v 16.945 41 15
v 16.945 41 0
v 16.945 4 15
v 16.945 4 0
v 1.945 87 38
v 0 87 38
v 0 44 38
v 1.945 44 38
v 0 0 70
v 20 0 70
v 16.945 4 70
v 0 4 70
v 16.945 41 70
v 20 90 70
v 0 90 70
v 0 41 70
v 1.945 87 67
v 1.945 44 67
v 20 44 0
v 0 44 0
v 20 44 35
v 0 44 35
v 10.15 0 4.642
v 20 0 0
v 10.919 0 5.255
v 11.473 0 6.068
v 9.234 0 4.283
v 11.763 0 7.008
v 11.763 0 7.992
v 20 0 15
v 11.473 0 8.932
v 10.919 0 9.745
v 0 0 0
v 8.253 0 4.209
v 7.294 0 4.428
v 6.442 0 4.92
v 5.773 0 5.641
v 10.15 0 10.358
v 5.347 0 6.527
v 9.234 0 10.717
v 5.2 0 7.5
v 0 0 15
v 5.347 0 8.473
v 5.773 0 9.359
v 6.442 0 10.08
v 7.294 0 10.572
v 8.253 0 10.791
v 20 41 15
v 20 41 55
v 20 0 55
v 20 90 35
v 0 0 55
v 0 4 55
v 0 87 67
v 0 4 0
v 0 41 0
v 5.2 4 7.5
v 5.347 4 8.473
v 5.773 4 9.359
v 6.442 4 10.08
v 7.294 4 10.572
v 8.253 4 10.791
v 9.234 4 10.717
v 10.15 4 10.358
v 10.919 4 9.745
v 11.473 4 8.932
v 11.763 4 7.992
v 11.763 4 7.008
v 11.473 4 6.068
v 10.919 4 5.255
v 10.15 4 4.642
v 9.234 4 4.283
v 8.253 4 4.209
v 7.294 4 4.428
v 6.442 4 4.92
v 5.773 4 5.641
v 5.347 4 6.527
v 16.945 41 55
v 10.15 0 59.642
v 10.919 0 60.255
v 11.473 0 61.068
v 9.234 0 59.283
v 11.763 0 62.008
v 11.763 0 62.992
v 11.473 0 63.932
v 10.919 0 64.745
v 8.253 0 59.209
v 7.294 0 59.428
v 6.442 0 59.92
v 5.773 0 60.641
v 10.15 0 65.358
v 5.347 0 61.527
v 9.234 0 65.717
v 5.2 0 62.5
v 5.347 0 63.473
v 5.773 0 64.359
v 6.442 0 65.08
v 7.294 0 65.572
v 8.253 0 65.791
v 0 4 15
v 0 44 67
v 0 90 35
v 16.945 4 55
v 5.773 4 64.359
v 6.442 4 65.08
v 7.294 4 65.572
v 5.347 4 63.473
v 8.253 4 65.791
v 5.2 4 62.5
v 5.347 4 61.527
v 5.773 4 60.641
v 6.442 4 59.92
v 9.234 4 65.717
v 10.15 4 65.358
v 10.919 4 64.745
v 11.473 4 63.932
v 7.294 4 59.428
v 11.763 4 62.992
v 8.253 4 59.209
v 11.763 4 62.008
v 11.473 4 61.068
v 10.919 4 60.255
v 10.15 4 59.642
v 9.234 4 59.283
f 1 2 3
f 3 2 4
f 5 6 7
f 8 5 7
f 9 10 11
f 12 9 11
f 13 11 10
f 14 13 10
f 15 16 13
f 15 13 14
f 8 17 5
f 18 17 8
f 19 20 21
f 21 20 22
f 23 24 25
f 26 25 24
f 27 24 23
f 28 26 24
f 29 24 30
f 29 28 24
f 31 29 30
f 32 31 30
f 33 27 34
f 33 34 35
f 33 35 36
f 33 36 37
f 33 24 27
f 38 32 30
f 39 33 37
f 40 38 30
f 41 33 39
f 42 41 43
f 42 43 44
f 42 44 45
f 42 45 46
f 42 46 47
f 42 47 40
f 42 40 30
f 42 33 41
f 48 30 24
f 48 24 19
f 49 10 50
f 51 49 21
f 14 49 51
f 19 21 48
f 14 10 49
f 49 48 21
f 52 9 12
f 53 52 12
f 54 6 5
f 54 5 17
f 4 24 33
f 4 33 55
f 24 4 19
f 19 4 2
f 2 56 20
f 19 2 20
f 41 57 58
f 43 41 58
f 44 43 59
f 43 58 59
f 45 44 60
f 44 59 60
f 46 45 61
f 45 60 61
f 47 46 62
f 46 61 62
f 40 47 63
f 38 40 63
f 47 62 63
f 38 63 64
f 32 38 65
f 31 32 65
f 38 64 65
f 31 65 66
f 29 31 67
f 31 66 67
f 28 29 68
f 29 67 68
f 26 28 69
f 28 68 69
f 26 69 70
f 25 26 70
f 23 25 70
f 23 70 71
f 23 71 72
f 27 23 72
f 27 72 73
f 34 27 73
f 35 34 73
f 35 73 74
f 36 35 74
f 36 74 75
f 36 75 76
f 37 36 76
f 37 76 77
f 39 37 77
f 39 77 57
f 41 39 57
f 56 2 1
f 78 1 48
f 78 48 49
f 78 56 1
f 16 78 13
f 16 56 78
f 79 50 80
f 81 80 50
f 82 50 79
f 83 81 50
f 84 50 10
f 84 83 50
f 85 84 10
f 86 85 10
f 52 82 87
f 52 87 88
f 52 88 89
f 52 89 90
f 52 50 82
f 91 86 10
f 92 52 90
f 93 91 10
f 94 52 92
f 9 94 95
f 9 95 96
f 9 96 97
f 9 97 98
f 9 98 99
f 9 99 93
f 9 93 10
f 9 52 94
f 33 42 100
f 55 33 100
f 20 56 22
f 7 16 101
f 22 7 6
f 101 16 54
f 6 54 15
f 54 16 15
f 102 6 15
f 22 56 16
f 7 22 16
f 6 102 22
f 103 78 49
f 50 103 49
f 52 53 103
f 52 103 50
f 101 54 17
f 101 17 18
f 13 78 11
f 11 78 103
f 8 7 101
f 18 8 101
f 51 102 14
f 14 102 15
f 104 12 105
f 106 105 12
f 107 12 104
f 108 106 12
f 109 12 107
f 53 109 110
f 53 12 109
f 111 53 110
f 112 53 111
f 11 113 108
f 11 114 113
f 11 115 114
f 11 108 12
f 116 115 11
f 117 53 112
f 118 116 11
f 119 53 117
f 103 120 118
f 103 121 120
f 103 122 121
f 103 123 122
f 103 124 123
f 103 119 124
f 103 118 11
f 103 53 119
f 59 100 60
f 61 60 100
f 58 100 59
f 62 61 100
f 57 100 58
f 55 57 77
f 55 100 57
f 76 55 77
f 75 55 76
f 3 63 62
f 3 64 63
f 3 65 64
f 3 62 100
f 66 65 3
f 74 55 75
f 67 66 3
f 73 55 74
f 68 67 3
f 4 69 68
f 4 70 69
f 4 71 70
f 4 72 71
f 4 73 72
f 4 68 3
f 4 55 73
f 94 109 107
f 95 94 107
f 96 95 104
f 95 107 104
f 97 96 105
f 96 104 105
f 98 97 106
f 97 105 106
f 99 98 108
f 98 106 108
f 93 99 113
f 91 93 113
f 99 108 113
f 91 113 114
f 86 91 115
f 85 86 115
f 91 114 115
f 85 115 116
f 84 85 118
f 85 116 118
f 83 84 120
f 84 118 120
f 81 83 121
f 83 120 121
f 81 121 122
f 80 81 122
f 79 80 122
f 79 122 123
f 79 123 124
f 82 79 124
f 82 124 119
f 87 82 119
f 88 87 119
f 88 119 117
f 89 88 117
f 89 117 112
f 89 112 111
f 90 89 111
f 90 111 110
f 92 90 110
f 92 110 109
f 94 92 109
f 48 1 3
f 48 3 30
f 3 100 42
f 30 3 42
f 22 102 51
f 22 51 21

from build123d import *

# Parameters (mm, degrees)
SKETCH004_W  = 43
SKETCH004_H  = 29
PAD004_DEPTH = 2
SKETCH003_W  = 17
SKETCH003_H  = 37
PAD003_DEPTH = 70
SKETCH001_W  = 41
SKETCH001_H  = 40
PAD001_DEPTH = 20
SKETCH002_W  = 46
SKETCH002_H  = 35
PAD002_DEPTH = 20
SKETCH_W     = 90
SKETCH_H     = 70
PAD_DEPTH    = 20
SKETCH005_R  = 3.3
HOLE_DEPTH   = 4.001


with BuildPart() as body004:
    # Sketch004 (on Face1 of CopyPad003) → Pad004 (new body)
    with BuildSketch(Plane(origin=(-0.05496, 0, 0), x_dir=(0, -1, 0), z_dir=(-1, 0, 0))):
        with Locations((-65.5, 52.5)):
            Rectangle(SKETCH004_W, SKETCH004_H)
    extrude(amount=-PAD004_DEPTH)


with BuildPart() as body003:
    # Sketch003 (on Face1 of CopyPad002) → Pad003 (new body)
    with BuildSketch(Plane(origin=(0, 0, 0), x_dir=(1, 0, 0), z_dir=(0, 0, -1))):
        with Locations((8.44504, -22.5)):
            Rectangle(SKETCH003_W, SKETCH003_H)
    extrude(amount=-PAD003_DEPTH)


with BuildPart() as body001:
    # Sketch001 (on Face1 of CopyPad) → Pad001 (new body)
    with BuildSketch(Plane(origin=(0, 0, 0), x_dir=(0, -1, 0), z_dir=(-1, 0, 0))):
        with Locations((-20.5, 35)):
            Rectangle(SKETCH001_W, SKETCH001_H)
    extrude(amount=-PAD001_DEPTH)


with BuildPart() as body002:
    # Sketch002 (on Face1 of CopyPad001) → Pad002 (new body)
    with BuildSketch(Plane(origin=(0, 0, 0), x_dir=(0, -1, 0), z_dir=(-1, 0, 0))):
        with Locations((-67, 17.5)):
            Rectangle(SKETCH002_W, SKETCH002_H)
    extrude(amount=-PAD002_DEPTH)


with BuildPart() as body:
    # Sketch → Pad (new body)
    with BuildSketch(Plane.YZ):
        with Locations((45, 35)):
            Rectangle(SKETCH_W, SKETCH_H)
    extrude(amount=PAD_DEPTH)

    # Boolean: cut Body004, Body003, Body001, Body002
    add(body004.part, mode=Mode.SUBTRACT)
    add(body003.part, mode=Mode.SUBTRACT)
    add(body001.part, mode=Mode.SUBTRACT)
    add(body002.part, mode=Mode.SUBTRACT)

    # Sketch005 (on Face24 of Boolean) → Hole (cut, through all)
    with BuildSketch(Plane(origin=(0, 4, 0), x_dir=(-1, 0, 0), z_dir=(0, 1, 0))):
        with Locations((-8.5, 7.5)):
            Circle(SKETCH005_R)
        with Locations((-8.5, 62.5)):
            Circle(SKETCH005_R)
    extrude(amount=-HOLE_DEPTH, mode=Mode.SUBTRACT)


solid = body.part
